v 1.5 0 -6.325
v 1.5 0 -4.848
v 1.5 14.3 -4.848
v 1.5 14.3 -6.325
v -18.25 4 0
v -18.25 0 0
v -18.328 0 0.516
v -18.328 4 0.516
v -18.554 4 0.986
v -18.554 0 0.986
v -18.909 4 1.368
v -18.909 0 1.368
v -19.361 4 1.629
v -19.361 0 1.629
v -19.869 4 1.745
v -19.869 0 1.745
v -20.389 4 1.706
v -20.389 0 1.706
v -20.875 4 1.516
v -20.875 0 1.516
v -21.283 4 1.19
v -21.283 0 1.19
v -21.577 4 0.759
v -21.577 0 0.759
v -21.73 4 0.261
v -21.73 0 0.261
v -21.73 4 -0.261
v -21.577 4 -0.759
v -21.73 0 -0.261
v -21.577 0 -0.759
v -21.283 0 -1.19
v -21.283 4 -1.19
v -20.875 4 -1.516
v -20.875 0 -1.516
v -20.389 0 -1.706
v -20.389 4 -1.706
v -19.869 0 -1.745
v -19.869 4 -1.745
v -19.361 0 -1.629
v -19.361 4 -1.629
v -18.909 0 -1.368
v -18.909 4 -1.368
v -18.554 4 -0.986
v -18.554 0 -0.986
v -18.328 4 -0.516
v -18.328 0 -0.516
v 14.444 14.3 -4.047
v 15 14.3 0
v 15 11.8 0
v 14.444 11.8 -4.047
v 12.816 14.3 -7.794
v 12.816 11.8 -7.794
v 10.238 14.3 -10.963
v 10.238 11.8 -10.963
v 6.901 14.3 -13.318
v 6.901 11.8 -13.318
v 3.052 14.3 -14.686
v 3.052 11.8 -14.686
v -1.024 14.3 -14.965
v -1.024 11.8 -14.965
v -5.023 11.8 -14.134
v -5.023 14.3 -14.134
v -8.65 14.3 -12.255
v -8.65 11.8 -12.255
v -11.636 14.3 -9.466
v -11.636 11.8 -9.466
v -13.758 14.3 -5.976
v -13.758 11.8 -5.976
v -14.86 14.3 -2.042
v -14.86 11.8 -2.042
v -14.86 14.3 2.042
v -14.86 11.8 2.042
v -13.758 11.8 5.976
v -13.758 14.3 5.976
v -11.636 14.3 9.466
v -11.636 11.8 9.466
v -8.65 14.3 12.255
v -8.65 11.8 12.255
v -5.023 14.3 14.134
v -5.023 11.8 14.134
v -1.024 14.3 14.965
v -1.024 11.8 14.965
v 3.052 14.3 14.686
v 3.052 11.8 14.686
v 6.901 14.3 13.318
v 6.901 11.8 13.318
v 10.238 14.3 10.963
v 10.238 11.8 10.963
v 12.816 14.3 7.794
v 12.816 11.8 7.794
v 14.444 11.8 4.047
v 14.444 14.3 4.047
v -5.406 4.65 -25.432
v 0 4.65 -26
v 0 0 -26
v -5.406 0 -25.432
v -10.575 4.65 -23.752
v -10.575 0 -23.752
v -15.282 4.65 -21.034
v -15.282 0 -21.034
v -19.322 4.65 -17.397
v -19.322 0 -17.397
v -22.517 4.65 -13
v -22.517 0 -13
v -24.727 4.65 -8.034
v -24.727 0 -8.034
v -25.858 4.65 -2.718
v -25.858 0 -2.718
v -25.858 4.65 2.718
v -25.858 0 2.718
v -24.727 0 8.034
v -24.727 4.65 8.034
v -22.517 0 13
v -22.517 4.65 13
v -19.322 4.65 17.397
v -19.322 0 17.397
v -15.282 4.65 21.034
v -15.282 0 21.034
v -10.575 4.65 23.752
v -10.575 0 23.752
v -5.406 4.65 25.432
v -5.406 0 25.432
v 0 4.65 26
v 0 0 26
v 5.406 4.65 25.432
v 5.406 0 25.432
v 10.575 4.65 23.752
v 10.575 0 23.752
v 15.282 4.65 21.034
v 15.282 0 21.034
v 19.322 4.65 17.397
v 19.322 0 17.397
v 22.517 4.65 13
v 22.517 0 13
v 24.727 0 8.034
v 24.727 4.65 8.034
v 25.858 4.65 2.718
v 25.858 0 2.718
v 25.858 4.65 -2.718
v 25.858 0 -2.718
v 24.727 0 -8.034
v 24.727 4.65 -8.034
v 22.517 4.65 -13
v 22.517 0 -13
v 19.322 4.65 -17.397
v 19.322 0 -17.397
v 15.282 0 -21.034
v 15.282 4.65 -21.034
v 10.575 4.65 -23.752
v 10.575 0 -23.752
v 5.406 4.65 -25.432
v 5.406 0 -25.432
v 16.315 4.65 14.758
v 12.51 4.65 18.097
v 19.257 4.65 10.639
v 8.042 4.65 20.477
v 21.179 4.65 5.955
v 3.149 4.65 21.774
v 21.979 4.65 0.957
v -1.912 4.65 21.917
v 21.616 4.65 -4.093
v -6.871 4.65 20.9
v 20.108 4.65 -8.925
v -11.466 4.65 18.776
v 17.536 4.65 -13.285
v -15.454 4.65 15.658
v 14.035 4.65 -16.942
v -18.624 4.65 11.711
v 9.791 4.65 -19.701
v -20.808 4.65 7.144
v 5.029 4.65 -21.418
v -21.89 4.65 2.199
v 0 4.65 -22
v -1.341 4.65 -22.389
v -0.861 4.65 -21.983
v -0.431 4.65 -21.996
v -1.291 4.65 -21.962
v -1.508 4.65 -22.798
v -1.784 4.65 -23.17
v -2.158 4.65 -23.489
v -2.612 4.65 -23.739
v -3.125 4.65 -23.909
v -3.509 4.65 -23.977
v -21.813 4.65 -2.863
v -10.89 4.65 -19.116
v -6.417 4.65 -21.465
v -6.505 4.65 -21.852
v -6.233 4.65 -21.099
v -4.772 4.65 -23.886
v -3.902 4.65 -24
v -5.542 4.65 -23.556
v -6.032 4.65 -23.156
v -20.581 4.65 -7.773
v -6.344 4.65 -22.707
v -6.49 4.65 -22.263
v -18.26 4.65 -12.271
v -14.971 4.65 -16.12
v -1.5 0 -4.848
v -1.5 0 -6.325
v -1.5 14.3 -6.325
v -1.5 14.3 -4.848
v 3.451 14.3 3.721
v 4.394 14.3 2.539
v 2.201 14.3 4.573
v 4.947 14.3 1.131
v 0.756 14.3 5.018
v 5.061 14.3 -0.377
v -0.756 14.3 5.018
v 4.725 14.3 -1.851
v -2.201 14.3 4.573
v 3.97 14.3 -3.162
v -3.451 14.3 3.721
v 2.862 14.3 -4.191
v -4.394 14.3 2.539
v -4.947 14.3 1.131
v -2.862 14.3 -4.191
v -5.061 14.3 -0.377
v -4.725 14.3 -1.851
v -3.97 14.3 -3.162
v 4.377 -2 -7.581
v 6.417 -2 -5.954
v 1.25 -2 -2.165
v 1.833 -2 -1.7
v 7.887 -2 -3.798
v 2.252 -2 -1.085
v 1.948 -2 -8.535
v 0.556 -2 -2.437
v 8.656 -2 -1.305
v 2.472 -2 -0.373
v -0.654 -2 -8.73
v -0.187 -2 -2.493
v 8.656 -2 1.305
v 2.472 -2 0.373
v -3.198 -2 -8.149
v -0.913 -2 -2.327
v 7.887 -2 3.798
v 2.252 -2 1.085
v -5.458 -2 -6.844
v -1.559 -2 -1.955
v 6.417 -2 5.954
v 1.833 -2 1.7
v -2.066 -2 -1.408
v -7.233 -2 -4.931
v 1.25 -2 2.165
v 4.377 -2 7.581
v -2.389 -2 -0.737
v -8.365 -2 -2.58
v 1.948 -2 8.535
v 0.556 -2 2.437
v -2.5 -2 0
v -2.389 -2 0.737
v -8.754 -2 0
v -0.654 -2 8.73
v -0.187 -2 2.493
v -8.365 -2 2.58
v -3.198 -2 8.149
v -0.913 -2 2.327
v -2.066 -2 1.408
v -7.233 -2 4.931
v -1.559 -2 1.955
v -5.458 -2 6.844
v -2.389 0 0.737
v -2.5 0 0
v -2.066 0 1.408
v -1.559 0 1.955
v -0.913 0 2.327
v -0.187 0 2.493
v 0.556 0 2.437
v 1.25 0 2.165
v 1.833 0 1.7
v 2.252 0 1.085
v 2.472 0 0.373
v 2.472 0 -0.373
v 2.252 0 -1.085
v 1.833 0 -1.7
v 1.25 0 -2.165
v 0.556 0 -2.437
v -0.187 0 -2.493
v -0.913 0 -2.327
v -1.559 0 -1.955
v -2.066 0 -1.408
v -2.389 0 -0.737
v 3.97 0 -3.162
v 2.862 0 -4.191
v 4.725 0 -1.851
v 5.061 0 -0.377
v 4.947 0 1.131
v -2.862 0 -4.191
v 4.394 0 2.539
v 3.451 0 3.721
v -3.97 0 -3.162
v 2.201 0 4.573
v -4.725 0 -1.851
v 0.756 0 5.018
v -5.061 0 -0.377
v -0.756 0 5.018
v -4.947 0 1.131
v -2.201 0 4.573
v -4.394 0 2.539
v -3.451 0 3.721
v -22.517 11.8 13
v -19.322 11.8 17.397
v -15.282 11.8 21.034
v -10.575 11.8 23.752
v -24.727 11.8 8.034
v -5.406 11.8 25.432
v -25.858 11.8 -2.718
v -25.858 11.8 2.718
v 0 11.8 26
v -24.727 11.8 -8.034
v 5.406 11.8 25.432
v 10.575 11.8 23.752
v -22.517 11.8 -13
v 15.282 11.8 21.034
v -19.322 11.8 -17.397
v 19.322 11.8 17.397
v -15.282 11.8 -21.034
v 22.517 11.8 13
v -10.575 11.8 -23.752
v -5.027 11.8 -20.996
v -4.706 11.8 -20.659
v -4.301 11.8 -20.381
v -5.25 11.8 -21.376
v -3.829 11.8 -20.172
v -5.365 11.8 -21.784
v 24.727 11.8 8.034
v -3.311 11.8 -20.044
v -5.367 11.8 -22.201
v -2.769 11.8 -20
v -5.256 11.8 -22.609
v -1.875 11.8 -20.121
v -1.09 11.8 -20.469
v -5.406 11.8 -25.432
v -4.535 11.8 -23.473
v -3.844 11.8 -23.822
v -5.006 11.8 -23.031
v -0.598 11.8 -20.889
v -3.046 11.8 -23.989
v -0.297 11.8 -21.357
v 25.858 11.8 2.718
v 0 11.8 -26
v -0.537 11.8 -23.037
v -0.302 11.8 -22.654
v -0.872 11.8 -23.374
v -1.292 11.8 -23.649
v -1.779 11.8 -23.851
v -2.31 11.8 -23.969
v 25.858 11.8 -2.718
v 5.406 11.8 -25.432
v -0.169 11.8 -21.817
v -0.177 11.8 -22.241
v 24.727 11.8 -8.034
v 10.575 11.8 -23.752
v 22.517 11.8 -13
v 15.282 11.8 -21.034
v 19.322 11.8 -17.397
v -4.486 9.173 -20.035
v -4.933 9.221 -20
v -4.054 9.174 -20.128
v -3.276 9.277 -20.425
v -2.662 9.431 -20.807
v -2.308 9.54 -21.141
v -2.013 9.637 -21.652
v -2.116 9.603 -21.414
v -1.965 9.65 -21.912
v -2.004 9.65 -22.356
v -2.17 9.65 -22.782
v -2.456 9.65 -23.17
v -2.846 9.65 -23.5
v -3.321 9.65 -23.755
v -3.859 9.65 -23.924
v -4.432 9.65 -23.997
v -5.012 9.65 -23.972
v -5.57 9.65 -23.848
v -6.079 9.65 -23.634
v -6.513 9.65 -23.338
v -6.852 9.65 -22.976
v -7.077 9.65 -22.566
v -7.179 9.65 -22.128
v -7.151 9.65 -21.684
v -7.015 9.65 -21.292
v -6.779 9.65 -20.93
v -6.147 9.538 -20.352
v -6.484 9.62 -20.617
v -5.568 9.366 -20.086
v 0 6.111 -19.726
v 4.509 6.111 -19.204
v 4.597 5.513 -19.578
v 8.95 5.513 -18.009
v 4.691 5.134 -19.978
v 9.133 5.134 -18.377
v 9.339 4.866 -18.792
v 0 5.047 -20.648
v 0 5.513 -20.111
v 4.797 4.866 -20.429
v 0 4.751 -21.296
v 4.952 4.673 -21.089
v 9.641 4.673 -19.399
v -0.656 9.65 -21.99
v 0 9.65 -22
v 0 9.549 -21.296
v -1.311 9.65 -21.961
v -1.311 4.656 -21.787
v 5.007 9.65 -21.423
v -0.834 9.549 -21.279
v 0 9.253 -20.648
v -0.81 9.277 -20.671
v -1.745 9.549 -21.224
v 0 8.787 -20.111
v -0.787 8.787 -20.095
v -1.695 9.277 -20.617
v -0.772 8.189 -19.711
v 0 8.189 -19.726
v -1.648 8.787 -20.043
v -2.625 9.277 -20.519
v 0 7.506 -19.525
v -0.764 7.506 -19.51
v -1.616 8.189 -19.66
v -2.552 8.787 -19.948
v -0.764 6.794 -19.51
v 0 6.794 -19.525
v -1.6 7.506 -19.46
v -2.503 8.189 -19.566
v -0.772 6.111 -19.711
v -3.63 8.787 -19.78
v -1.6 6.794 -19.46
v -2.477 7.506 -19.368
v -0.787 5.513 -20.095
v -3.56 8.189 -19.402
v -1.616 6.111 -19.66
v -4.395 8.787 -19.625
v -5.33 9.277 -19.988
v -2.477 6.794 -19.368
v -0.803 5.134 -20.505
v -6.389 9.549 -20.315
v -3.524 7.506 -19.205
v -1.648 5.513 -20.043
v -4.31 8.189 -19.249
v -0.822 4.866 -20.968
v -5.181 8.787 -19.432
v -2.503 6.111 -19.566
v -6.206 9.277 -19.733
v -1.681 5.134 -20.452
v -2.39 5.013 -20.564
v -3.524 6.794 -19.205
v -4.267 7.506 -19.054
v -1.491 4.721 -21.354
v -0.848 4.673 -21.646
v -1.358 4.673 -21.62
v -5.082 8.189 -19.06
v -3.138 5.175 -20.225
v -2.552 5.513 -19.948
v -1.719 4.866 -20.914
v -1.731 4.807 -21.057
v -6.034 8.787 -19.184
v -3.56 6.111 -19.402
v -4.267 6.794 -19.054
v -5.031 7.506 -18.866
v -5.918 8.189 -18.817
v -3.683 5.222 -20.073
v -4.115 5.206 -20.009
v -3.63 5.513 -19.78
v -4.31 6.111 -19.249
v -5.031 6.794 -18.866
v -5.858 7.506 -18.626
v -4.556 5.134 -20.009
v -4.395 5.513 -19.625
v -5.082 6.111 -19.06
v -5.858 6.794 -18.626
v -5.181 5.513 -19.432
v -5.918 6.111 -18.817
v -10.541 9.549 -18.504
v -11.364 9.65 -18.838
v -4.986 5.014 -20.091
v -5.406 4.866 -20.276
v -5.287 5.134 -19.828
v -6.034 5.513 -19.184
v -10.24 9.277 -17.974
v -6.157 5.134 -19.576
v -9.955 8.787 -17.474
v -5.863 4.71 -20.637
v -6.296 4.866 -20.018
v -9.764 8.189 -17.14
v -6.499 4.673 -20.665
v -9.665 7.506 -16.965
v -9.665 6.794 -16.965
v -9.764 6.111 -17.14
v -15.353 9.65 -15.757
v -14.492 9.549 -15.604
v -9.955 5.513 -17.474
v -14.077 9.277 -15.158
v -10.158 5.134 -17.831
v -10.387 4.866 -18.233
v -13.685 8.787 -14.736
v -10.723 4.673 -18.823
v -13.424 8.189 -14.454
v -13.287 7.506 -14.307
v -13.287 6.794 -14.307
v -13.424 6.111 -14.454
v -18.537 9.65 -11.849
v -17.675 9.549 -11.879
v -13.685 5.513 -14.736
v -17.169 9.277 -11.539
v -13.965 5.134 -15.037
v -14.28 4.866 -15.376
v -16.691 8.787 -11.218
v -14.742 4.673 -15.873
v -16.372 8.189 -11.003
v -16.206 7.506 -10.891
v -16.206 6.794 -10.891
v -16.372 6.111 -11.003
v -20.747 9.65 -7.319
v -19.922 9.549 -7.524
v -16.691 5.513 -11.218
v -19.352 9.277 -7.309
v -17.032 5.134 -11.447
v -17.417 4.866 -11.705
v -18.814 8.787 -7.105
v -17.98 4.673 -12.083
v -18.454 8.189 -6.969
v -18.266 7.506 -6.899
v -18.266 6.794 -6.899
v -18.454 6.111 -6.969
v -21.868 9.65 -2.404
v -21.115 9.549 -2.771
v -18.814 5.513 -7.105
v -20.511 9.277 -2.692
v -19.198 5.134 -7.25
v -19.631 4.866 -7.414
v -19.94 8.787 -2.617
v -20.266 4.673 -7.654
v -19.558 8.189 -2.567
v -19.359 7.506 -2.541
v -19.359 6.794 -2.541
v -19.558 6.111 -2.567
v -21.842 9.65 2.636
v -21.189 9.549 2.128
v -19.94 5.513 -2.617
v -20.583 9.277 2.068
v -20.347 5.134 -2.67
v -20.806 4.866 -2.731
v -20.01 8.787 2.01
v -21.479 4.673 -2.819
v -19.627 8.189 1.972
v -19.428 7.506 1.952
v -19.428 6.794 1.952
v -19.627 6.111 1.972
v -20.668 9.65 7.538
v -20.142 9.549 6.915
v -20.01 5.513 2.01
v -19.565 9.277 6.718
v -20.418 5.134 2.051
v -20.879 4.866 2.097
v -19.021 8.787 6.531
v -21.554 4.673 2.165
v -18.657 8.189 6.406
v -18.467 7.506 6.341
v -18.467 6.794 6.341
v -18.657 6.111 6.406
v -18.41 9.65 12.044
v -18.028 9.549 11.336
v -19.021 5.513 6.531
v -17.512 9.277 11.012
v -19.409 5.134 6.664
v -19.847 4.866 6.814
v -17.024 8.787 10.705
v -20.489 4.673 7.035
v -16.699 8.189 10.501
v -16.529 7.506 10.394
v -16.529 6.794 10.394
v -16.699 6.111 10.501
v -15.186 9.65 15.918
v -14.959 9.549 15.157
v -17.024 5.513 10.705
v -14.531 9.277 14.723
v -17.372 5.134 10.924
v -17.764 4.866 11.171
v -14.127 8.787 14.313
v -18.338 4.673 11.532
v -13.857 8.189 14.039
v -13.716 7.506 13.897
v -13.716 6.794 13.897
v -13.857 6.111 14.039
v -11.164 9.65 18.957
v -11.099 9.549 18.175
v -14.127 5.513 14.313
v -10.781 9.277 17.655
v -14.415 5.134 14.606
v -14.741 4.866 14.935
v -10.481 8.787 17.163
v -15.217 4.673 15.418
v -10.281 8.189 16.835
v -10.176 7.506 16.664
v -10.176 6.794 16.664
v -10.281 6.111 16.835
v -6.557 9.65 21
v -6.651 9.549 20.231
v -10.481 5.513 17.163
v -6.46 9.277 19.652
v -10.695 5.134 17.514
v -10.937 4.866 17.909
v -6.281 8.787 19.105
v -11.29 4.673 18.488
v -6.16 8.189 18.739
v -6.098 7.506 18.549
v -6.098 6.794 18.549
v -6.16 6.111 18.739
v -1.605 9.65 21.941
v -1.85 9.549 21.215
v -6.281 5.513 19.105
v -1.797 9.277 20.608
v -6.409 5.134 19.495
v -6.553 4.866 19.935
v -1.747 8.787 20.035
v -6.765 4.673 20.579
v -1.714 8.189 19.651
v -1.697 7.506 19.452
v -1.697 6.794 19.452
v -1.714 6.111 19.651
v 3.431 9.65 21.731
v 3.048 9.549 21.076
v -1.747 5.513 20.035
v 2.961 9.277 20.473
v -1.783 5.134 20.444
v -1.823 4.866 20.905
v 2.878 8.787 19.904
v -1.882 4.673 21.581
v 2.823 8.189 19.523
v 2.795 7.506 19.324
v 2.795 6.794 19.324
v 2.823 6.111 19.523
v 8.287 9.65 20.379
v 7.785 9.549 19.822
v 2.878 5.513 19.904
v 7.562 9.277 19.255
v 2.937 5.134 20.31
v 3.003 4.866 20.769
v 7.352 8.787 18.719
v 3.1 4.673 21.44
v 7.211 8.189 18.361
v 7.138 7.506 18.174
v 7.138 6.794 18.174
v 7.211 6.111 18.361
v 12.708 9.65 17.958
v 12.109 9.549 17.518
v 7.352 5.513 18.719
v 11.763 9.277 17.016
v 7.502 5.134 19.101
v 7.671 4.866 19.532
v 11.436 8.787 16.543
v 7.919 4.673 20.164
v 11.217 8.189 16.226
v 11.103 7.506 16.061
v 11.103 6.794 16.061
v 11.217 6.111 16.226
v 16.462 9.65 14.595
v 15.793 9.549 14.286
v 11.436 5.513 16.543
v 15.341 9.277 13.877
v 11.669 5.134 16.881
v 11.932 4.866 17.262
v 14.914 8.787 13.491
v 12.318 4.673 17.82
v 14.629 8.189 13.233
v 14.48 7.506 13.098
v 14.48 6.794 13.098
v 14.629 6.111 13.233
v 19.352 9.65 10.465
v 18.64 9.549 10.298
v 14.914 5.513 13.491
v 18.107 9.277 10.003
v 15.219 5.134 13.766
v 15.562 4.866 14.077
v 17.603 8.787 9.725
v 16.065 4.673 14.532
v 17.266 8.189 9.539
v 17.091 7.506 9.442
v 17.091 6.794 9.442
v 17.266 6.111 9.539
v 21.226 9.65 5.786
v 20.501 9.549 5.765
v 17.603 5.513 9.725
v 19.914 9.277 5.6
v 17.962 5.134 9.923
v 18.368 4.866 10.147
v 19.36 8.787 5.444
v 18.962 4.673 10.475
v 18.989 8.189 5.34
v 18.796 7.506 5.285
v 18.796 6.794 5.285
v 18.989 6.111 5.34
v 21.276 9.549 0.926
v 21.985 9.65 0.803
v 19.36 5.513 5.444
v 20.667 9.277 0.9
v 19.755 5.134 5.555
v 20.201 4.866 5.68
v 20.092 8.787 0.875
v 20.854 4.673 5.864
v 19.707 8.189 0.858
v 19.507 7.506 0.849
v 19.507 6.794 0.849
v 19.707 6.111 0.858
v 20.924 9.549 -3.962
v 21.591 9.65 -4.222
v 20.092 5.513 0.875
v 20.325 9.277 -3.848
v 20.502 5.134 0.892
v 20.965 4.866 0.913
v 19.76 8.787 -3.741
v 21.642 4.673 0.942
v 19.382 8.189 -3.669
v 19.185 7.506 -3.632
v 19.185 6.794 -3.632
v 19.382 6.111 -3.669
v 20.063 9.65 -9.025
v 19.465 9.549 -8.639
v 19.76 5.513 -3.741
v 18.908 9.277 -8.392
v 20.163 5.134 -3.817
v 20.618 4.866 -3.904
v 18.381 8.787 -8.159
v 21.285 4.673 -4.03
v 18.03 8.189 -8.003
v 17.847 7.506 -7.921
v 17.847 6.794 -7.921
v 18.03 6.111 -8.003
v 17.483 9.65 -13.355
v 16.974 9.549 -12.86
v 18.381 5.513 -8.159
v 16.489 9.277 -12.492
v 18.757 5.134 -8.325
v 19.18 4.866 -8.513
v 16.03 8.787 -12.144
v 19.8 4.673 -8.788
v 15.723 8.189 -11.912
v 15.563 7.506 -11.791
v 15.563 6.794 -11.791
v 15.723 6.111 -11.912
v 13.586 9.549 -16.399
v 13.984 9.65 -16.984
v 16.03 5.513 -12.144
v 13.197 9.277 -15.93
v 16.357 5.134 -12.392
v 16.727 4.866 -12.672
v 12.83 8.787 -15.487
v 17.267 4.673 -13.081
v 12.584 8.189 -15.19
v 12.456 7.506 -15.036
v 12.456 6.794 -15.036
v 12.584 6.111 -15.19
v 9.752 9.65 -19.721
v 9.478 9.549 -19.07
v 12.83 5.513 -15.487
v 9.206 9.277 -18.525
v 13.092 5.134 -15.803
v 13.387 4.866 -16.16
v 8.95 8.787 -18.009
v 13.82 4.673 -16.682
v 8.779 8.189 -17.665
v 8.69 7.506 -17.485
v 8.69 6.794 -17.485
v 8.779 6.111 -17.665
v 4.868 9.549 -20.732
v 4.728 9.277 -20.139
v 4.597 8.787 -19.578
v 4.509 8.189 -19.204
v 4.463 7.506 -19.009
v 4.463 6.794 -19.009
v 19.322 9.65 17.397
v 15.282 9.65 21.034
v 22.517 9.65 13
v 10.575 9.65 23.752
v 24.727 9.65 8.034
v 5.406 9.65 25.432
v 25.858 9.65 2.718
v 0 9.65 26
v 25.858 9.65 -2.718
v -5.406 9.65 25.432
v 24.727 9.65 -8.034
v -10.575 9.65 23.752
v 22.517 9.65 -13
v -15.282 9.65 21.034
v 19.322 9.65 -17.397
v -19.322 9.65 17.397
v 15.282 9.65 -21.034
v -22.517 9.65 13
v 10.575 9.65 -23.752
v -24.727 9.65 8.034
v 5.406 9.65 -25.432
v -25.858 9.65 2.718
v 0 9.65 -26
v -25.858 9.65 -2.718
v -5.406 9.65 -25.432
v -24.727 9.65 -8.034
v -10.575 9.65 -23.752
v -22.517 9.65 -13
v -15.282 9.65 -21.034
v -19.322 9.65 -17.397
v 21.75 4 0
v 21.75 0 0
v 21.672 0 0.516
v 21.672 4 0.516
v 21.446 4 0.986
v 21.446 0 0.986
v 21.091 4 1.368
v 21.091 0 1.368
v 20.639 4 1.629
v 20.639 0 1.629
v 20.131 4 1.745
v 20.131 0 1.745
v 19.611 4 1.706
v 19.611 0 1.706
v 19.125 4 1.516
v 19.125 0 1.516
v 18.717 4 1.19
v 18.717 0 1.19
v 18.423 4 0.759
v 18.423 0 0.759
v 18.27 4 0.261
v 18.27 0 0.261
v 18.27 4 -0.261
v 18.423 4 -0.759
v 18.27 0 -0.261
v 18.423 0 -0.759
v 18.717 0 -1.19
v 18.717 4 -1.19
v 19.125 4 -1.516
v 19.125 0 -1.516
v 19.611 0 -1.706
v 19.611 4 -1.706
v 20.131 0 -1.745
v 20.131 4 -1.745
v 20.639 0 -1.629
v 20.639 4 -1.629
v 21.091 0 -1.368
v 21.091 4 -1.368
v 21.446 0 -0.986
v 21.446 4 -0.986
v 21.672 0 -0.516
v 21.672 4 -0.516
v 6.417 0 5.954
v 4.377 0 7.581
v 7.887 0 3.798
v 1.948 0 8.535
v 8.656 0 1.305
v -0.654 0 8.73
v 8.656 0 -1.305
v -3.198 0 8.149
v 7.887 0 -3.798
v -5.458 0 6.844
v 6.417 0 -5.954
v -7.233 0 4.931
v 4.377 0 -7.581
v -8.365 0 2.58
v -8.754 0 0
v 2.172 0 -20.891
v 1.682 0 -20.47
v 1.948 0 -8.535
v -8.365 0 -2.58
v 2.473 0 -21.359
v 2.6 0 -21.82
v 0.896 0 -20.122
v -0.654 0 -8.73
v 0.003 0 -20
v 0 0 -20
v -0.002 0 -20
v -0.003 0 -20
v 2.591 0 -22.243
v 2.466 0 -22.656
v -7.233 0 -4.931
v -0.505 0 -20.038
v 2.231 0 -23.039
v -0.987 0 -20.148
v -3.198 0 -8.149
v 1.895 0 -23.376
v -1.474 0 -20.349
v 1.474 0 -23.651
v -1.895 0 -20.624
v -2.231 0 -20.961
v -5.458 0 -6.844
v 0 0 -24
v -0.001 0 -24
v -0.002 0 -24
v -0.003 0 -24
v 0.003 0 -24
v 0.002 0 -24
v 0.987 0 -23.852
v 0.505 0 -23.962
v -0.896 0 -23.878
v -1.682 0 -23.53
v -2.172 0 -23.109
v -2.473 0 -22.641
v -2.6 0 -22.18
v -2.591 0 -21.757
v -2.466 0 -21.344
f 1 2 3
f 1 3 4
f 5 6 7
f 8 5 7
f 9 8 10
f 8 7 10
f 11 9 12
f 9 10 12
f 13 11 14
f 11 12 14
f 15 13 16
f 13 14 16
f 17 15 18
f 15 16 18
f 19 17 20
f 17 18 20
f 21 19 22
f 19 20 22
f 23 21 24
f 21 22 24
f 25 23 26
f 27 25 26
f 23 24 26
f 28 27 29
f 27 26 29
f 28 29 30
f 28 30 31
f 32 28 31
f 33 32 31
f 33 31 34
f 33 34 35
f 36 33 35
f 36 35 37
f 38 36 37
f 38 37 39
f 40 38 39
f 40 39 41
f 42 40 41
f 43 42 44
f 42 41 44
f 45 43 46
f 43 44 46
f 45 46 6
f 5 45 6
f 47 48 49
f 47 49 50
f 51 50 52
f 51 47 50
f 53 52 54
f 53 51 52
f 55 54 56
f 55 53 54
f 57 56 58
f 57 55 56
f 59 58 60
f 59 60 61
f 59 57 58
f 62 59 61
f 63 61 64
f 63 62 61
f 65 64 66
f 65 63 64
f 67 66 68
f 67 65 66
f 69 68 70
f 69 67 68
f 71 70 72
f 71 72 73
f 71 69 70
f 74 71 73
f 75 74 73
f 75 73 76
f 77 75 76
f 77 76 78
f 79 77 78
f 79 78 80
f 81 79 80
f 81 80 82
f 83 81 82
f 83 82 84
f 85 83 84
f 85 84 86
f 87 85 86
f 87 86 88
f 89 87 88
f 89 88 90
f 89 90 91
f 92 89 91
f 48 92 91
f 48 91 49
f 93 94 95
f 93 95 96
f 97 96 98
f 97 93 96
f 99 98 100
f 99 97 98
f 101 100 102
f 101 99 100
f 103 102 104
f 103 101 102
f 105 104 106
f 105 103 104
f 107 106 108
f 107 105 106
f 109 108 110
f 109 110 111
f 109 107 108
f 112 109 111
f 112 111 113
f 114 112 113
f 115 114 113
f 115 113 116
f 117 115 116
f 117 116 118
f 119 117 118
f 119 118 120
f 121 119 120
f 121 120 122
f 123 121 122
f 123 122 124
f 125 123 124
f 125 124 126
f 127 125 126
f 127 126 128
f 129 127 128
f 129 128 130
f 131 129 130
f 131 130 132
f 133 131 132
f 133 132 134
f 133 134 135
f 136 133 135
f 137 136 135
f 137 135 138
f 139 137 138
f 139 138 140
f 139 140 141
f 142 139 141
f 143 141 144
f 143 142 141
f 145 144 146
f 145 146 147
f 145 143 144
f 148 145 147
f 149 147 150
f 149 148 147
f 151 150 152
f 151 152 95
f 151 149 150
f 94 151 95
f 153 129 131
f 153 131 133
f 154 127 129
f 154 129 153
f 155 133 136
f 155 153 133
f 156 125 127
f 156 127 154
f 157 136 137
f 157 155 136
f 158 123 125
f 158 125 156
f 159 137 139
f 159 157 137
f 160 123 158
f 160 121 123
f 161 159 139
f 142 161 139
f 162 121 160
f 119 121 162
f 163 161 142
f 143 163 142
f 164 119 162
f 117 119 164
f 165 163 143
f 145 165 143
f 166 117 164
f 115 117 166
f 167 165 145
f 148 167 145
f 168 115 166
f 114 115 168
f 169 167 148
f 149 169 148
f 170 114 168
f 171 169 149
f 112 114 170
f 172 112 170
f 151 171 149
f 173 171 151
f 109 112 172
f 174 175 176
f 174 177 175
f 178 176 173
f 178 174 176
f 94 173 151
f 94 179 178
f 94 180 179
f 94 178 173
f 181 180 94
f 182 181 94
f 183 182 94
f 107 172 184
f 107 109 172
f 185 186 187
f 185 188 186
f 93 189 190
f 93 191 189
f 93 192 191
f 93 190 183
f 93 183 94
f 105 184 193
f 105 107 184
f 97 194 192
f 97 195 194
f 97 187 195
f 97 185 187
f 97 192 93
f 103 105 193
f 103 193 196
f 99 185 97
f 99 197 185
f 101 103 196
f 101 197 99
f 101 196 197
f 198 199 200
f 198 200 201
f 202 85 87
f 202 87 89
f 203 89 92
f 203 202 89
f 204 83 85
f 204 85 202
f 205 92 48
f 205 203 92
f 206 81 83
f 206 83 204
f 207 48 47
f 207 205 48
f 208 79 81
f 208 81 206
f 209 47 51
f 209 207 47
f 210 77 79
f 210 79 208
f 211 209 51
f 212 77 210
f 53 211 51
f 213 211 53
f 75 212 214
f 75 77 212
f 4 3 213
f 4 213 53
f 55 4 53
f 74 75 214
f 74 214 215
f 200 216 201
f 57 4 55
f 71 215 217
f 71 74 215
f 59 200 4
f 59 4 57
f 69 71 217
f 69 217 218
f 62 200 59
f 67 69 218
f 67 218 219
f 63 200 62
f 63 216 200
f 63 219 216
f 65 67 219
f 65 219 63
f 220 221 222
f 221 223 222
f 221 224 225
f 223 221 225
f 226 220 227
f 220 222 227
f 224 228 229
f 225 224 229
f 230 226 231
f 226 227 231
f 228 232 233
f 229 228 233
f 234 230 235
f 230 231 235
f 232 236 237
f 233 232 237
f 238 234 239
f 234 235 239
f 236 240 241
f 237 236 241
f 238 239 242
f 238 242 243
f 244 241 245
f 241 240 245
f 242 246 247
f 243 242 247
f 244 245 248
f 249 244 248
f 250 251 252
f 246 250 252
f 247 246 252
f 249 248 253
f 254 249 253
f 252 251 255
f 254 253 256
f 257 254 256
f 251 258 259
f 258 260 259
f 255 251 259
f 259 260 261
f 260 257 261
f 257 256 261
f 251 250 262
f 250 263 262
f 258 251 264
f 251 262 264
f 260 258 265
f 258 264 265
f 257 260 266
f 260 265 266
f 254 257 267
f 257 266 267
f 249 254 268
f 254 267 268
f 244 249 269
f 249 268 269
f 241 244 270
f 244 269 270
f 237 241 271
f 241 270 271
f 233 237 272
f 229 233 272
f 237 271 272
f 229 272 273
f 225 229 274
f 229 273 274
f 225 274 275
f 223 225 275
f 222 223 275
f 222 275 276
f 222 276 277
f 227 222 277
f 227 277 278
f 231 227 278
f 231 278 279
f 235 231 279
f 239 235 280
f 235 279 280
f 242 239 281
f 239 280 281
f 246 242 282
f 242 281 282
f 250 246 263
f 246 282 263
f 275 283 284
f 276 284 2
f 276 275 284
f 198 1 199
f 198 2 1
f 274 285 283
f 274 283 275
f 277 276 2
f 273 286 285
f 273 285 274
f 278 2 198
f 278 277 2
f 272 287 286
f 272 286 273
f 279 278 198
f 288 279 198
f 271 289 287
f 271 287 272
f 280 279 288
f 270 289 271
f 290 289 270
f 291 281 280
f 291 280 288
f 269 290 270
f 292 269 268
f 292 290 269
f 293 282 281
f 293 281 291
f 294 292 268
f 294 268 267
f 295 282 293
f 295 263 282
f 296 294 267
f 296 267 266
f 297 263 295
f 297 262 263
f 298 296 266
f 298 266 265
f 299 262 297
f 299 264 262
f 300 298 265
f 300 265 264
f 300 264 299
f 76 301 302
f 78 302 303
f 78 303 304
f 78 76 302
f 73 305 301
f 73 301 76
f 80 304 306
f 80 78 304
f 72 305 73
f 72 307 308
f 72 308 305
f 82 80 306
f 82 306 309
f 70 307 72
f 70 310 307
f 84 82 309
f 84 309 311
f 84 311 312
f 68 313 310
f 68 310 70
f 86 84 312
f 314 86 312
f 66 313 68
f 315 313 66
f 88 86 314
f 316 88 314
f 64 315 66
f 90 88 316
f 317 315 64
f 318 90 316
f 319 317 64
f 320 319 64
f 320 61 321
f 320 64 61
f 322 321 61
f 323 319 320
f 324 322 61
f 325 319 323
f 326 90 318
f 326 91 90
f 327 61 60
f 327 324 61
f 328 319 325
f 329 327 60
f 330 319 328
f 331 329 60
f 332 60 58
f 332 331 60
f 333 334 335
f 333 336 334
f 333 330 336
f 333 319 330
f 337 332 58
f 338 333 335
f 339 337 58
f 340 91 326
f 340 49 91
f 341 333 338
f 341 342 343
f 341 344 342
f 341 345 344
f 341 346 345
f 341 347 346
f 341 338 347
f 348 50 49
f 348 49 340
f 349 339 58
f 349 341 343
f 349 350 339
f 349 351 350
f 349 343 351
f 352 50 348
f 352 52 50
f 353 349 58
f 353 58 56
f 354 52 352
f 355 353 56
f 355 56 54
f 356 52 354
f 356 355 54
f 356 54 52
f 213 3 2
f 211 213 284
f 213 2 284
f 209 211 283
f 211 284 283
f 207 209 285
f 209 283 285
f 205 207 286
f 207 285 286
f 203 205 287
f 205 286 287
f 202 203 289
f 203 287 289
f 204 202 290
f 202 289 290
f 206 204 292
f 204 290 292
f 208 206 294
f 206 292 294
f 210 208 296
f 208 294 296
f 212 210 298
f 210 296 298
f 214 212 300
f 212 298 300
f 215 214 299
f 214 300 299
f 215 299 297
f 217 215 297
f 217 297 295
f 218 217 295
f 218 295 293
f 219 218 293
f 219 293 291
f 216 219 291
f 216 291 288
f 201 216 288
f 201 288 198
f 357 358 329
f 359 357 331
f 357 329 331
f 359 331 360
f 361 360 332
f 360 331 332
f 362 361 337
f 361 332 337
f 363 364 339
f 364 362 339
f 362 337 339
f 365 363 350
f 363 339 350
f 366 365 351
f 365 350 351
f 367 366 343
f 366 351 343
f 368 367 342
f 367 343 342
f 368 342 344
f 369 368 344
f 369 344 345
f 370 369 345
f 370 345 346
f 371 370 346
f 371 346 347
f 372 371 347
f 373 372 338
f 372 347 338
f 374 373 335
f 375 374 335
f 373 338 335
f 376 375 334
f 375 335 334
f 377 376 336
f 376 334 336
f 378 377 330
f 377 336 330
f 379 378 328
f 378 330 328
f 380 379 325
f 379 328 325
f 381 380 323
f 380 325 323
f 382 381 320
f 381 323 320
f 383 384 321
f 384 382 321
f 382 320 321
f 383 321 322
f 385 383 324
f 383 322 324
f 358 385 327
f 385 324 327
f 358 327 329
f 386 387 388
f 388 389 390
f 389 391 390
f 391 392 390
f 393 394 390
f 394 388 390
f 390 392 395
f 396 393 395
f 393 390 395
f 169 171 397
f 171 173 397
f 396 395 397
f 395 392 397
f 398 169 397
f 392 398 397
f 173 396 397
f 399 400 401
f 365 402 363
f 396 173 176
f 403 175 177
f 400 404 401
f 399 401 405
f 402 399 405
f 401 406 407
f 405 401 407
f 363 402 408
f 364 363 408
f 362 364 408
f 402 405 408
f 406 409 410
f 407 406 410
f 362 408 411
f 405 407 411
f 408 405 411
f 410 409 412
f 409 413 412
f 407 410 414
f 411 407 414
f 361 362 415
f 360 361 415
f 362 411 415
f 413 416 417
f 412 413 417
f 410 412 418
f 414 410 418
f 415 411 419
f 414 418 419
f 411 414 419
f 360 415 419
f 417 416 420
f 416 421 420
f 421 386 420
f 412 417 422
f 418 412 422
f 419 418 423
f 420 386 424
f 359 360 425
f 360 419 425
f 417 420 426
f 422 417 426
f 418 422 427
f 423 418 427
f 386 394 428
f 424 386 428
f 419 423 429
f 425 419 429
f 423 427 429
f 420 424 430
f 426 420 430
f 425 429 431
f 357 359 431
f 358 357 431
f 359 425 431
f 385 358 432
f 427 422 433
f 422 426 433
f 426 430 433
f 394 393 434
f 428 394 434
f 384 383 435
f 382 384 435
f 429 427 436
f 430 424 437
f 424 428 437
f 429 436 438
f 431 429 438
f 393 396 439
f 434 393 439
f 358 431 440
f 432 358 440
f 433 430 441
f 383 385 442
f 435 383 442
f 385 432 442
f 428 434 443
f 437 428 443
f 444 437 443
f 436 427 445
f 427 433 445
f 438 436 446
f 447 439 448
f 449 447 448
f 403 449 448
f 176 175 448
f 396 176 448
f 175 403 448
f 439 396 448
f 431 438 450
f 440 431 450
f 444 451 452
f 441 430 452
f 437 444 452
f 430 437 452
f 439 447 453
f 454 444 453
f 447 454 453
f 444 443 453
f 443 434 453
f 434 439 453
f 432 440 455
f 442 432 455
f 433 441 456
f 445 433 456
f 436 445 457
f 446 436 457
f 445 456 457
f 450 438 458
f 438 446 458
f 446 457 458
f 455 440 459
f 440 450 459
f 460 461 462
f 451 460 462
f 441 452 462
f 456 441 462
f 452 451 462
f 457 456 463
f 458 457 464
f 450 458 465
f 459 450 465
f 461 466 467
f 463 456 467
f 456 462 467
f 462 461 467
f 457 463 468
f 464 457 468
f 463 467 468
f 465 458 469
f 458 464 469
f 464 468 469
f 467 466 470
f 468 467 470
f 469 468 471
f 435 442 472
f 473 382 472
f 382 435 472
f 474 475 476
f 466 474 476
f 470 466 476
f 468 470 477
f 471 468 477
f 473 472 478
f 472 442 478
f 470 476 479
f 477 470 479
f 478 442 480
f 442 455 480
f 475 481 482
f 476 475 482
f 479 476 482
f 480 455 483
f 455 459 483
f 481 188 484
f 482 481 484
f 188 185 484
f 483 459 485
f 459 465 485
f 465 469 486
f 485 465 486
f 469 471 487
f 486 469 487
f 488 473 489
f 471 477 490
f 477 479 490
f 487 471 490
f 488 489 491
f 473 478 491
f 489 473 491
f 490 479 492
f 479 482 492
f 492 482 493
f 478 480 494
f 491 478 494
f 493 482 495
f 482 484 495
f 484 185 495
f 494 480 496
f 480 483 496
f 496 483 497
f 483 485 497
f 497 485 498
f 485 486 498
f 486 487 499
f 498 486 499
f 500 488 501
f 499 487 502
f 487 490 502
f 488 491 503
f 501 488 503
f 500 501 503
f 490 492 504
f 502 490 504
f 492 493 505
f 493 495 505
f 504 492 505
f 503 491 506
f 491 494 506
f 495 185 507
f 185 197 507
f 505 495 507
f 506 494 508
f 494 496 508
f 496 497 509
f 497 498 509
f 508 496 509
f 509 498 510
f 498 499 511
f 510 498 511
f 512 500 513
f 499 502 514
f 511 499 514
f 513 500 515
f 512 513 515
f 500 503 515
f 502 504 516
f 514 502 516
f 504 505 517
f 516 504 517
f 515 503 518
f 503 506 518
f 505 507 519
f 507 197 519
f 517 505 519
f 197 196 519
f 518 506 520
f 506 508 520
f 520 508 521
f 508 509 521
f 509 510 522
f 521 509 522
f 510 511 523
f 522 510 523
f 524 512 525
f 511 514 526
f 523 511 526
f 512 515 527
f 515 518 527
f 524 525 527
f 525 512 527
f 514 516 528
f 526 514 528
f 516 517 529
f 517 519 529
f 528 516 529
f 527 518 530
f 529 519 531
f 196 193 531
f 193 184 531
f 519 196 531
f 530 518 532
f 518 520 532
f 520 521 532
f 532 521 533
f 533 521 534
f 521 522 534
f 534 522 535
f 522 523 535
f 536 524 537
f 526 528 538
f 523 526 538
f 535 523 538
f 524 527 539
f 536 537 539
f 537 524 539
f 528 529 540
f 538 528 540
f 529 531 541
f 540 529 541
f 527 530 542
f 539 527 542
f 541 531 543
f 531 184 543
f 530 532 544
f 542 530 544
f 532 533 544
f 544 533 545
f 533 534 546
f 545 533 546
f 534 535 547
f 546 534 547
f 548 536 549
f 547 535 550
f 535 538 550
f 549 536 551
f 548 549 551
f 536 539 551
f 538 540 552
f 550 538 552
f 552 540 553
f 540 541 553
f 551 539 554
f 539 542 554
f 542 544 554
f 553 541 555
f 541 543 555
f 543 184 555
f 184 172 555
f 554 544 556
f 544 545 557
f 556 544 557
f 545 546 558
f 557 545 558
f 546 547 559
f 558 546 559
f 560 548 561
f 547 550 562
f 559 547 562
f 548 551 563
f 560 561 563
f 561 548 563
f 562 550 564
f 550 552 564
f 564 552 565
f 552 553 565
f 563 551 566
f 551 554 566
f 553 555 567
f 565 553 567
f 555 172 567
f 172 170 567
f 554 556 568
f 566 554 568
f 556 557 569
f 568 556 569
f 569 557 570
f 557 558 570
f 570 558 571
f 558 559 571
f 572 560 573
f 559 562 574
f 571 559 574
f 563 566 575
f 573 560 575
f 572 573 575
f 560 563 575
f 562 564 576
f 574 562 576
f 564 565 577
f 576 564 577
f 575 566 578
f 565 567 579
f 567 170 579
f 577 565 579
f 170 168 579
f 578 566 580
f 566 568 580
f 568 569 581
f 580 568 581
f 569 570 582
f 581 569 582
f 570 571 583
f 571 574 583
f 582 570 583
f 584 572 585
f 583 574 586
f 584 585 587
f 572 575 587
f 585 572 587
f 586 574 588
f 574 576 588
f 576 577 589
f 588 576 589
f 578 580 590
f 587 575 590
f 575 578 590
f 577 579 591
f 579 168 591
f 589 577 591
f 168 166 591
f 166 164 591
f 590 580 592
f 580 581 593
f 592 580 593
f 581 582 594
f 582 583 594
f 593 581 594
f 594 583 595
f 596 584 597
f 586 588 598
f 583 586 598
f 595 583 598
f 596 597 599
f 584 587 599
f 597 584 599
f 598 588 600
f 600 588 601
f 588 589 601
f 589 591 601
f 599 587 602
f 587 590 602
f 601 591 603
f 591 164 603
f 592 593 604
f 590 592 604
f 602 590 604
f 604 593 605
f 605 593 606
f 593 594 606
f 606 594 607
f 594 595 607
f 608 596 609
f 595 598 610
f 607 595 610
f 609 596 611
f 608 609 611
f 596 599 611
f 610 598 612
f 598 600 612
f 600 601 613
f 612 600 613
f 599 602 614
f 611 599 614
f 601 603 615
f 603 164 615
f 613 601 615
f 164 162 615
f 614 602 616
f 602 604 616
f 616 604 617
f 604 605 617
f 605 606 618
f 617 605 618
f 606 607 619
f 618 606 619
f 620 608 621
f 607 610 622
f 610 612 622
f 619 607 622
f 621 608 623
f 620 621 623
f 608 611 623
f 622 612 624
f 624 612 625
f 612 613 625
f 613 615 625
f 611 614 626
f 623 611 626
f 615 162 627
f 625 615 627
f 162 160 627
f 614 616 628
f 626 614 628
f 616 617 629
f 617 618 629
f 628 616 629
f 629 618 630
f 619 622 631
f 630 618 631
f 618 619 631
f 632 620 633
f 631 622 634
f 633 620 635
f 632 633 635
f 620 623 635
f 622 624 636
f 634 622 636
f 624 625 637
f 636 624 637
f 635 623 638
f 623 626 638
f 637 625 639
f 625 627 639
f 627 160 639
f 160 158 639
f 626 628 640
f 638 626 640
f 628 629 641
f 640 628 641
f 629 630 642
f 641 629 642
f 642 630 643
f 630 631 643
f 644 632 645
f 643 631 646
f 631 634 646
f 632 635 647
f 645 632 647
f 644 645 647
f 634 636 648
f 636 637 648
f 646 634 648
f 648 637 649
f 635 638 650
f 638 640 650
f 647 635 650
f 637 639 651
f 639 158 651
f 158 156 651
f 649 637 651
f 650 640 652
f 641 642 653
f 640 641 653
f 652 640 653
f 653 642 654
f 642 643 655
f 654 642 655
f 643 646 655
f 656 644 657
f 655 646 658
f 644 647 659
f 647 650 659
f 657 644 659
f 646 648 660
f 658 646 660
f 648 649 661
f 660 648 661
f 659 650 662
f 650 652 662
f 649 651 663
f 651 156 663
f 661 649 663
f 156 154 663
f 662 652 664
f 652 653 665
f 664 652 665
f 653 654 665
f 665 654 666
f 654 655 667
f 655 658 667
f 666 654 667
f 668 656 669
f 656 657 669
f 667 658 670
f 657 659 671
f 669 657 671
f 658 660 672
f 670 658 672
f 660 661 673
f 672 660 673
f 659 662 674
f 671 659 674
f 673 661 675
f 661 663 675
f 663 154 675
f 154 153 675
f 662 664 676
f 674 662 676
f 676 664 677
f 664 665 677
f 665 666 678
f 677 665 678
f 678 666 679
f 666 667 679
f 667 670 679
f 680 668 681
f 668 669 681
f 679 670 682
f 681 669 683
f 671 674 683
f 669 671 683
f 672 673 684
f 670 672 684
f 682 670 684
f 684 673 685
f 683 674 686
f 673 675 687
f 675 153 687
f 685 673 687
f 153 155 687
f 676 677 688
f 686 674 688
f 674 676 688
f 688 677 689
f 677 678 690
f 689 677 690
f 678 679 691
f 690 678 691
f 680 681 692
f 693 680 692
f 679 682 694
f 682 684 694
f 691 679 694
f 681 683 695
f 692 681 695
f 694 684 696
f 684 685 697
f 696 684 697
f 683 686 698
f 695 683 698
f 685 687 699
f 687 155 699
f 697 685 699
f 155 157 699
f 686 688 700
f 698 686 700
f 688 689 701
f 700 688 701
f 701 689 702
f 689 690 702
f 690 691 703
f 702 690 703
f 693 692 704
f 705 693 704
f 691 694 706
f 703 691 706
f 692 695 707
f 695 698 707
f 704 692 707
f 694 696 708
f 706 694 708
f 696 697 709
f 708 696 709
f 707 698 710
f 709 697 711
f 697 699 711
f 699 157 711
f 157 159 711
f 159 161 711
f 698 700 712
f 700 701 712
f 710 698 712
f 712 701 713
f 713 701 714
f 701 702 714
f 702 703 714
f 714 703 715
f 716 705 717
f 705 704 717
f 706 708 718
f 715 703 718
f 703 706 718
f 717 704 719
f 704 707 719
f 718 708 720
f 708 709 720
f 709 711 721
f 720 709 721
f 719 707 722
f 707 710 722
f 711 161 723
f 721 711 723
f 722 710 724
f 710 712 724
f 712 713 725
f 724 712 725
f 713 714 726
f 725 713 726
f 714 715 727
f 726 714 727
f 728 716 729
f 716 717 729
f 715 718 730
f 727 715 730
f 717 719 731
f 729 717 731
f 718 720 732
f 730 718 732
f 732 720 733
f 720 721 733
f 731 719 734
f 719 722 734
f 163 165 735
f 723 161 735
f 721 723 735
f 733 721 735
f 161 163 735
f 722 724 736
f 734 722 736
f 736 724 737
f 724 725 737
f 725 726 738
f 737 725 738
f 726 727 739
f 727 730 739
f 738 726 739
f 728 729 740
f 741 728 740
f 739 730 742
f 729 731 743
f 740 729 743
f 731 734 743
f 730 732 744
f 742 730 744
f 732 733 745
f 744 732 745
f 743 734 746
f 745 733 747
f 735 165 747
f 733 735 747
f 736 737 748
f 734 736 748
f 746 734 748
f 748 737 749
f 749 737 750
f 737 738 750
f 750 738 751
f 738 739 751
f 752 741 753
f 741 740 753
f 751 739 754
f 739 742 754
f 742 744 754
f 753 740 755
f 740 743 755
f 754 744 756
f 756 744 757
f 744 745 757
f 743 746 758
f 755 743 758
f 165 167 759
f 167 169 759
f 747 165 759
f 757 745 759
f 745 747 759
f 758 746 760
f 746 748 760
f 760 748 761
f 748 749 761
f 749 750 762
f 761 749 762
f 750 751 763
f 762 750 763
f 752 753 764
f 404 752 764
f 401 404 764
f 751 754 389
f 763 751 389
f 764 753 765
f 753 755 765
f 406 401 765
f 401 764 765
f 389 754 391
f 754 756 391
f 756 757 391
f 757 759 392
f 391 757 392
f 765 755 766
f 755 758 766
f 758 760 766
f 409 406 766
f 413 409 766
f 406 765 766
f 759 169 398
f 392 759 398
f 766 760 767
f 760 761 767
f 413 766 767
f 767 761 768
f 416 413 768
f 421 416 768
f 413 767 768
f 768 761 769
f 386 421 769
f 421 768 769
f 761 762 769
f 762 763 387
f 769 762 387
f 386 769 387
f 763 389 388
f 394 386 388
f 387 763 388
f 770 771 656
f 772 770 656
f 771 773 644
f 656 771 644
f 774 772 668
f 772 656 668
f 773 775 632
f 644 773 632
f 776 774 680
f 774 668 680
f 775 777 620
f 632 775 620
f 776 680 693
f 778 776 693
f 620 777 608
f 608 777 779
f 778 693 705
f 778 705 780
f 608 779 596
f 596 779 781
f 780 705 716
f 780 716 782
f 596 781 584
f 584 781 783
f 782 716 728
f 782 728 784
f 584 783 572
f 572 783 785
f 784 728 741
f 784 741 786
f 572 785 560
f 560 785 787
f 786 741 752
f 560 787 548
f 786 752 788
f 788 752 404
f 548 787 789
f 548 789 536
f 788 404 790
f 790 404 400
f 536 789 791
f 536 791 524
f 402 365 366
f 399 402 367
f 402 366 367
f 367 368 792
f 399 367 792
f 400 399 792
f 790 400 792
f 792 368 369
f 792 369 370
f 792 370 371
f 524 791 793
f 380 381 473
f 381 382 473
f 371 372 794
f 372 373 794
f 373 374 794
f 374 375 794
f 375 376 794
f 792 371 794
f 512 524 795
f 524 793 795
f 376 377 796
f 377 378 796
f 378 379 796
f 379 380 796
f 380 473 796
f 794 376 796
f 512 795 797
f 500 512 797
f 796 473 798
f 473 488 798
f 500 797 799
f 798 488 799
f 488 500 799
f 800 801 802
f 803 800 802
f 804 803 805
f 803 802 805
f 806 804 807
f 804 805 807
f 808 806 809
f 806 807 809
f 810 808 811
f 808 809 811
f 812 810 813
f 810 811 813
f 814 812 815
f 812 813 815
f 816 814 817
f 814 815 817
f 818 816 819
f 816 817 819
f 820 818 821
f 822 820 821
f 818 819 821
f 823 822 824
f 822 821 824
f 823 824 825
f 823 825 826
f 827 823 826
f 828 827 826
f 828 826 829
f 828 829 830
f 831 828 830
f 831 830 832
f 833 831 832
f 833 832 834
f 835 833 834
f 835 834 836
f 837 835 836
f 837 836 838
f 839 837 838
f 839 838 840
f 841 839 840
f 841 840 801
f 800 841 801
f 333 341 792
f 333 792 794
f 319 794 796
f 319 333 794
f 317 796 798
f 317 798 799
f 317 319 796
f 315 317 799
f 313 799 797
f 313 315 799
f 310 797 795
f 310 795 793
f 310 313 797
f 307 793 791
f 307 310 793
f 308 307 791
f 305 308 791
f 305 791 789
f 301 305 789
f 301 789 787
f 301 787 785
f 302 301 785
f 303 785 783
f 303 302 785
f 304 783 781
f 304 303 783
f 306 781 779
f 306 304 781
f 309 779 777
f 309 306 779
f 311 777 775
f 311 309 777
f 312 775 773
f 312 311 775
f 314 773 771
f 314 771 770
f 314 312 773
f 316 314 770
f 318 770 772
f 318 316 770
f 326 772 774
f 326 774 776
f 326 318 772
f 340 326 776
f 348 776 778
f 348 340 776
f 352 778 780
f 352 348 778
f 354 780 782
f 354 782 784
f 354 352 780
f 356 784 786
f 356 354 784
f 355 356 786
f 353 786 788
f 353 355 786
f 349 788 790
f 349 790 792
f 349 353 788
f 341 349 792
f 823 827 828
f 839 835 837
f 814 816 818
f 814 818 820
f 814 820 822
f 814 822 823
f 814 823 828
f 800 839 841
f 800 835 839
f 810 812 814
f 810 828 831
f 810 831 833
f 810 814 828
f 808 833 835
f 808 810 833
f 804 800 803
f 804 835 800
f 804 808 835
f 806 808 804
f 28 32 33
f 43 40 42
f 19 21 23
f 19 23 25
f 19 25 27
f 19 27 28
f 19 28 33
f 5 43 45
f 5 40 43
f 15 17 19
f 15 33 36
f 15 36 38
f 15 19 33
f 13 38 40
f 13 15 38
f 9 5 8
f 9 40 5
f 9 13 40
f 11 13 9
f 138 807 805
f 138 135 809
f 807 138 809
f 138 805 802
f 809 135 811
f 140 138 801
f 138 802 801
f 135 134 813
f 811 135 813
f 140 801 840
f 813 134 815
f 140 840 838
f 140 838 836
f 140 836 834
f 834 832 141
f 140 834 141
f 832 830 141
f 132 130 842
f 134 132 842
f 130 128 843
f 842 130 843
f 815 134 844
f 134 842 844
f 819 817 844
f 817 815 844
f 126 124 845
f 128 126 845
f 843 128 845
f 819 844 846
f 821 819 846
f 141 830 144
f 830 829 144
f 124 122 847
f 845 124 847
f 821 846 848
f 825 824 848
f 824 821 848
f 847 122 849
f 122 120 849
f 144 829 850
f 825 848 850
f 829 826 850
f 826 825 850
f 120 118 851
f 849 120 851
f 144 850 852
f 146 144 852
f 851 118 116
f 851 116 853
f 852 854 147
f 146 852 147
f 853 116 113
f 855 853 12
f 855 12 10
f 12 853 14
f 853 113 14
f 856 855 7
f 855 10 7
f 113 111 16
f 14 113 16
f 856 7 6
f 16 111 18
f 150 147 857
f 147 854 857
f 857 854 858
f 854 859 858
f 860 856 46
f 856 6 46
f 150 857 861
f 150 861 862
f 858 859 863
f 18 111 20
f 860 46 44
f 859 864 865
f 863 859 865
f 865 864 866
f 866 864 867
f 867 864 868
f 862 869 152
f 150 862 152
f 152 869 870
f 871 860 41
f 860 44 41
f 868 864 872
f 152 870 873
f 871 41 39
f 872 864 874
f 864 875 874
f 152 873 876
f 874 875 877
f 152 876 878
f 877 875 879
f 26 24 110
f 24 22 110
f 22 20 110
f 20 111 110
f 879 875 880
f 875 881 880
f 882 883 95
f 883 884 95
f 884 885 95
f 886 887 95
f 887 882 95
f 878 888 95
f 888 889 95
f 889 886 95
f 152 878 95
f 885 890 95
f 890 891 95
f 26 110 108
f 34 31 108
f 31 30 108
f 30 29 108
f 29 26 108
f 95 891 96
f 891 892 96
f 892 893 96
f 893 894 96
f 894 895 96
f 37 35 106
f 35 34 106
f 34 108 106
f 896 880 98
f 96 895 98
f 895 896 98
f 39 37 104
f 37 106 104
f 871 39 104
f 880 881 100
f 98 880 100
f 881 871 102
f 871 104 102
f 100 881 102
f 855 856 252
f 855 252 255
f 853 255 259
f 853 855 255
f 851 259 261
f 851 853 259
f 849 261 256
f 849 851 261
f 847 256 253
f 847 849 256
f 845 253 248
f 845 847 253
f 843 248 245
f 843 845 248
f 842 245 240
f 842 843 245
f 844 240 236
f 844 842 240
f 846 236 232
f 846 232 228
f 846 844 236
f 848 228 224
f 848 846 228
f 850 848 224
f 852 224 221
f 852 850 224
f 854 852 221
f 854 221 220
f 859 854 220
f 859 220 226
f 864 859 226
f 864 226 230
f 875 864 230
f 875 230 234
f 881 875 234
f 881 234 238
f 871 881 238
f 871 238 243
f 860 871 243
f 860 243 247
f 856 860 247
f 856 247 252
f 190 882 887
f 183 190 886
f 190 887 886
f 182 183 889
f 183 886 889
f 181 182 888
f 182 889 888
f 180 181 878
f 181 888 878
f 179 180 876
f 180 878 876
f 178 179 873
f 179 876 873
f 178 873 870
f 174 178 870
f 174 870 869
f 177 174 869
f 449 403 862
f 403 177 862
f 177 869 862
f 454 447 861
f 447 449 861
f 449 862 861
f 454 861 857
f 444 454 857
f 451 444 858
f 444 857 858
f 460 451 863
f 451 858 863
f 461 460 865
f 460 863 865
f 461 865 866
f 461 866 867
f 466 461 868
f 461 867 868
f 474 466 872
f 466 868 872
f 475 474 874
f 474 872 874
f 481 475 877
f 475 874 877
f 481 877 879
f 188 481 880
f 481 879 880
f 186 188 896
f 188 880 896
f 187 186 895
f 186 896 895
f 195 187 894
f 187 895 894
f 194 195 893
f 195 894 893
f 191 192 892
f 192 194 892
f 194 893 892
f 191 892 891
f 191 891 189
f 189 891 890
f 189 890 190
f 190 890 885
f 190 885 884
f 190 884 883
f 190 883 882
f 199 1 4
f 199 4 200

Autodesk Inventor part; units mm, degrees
ref_plane "YZ Plane" through (0, 0, 0) normal (1, 0, 0) x (0, 1, 0)
sketch "Sketch1" plane through (0, 0, 0) normal (0, 1, 0) x (-1, 0, 0)
  circle A0 centre (0, 0) radius 5.075
  circle A1 centre (0, 0) radius 20
  line L0 (1.5, -3.825) -> (-1.5, -3.825)
  line L1 (-1.5, -3.825) -> (-1.5, -6.325)
  line L2 (-1.5, -6.325) -> (1.5, -6.325)
  line L3 (1.5, -6.325) -> (1.5, -3.825)
  line L4 (1.5, -3.825) -> (-1.5, -6.325) construction
  line L5 (-1.5, -3.825) -> (1.5, -6.325) construction
  circle A2 centre (0, 0) radius 2.5
  circle A3 centre (0, 0) radius 8.754
  point P0 (0, -5.075)
  point P1 (-1.5, -4.8483)
  point P2 (1.5, -4.8483)
  dimension "d0" = 10.15
  dimension "d1" = 40
  dimension "d2" = 1.25
  dimension "d3" = 3
  dimension "d17" = 5
extrude "Extrusion1" add sketch "Sketch1" along normal blind 14.3 contours A1 | A3
sketch "Sketch2" plane through (0, 0, 0) normal (1, 0, 0) x (0, 1, 0)
  line L0 (0, 0) -> (14.3, 0)
  line L1 (14.3, 0) -> (14.3, -22)
  line L2 (14.3, -22) -> (0, -22) construction
  line L3 (0, -22) -> (0, 0)
  line L4 (0, -22) -> (14.3, -22) construction
  line L5 (14.3, -22) -> (14.3, -20.0661)
  line L6 (0, -20) -> (14.3, -20) projected
  circle A0 centre (7.15, -22) radius 2.5
  line L7 (9.65, -22) -> (4.65, -22)
  line L8 (4.65, -22) -> (4.65, -26)
  line L9 (4.65, -26) -> (9.65, -26)
  line L10 (9.65, -26) -> (9.65, -22)
  line L11 (14.3, -20) -> (0, -20)
  line L12 (0, -20) -> (0, -26)
  line L13 (0, -26) -> (14.3, -26)
  line L14 (14.3, -26) -> (14.3, -20)
  point P0 (5.65, -20)
  point P1 (14.3, -22)
  point P2 (14.3, -20)
  point P3 (8.65, -20)
  point P4 (14.3, -20)
  point P5 (8.65, -20)
  dimension "d22" = 5
  dimension "d7" = 22
  dimension "d10" = 14.3
  dimension "d23" = 4
  dimension "d31" = 6
  dimension "d41" = 14.3
  dimension "d42" = 5
revolve "Revolution1" add sketch "Sketch2" angle 360 about axis through (0, 0, 0) along (0, 1, 0) contours L0 L1 L6 A0 L3 | L6 A0 L8 L13 L12 L3 | L1 L14 L13 L10 A0 L6 | A0 L6
extrude "Extrusion3" add sketch "Sketch1" against normal blind 2 contours A0 L3 L0 L1 | L1 L0 L3 A0 | A0 L3 L2 L1 | A3
revolve "Revolution4" cut sketch "Sketch2" angle 360 about axis through (0, 0, 0) along (0, 1, 0) contours A0 L6
sketch "Sketch3" plane through (0, 0, 0) normal (0, -1, 0) x (1, 0, 0)
  line L0 (0, 0) -> (0, -22)
  dimension "d25" = 22
ref_plane "Work Plane1" through (0, 0, 0) normal (0.6427876, -0.7660444, 0) x (0, 0, -1)
sketch "Sketch4" plane through (0, 0, 0) normal (0.6427876, -0.7660444, 0) x (0, 0, -1)
  ellipse E0 centre (0, 2.7318) end of major axis (22, 2.7318) minor radius 16.853 projected
  line L0 (0, 0) -> (22, 0)
  circle A0 centre (22, 0) radius 2
  dimension "d27" = 22
  dimension "d28" = 4
extrude "Extrusion4" cut sketch "Sketch4" against normal blind 9 contours A0 L0 E0 | E0 A0 | E0 L0 A0 picked at (22.5049, 0.1658)
extrude "Extrusion5" cut sketch "Sketch4" along normal blind 7 contours A0 L0 E0 | E0 A0 | E0 L0 A0 picked at (22.5049, 0.1658)
ref_plane "Work Plane2" through (0, 14.3, -22) normal (0.6427876, 0.7660444, 0) x (0, 0, 1)
sketch "Sketch5" plane through (0, 14.3, -22) normal (0.6427876, 0.7660444, 0) x (0, 0, 1)
  ellipse E0 centre (22, -0.5142) end of major axis (27.075, -0.5142) minor radius 3.8877 (17.1517, -1.6633) -> (17.1517, 0.6348) ccw projected
  line L0 (22, -0.5142) -> (0, -0.5142)
  circle A0 centre (0, -0.5142) radius 2
  point P0 (22, 9.1919)
  dimension "d35" = 22
  dimension "d36" = 4
extrude "Extrusion6" cut sketch "Sketch5" against normal blind 9
extrude "Extrusion7" cut sketch "Sketch5" along normal blind 8
extrude "Extrusion8" cut sketch "Sketch1" along normal through all contours A0 L3 L0 L1 | L1 L0 L3 A0 | A0 L3 L2 L1 | A2
sketch "Sketch6" plane through (0, 14.3, 0) normal (0, 1, 0) x (1, 0, 0)
  circle A0 centre (0, 0) radius 15
  circle A1 centre (0, 0) radius 35.6972
  dimension "d45" = 30
extrude "Extrusion9" cut sketch "Sketch6" against normal blind 2.5
sketch "Sketch7" plane through (0, 0, 0) normal (0, -1, 0) x (1, 0, 0)
  circle A0 centre (0, 0) radius 2.5 projected
  circle A1 centre (0, 0) radius 20
  line L0 (24, -7.5) -> (-24, -7.5)
  line L1 (-24, -7.5) -> (-24, 7.5)
  line L2 (-24, 7.5) -> (24, 7.5)
  line L3 (24, 7.5) -> (24, -7.5)
  line L4 (24, -7.5) -> (-24, 7.5) construction
  line L5 (-24, -7.5) -> (24, 7.5) construction
  circle A2 centre (0, 0) radius 11
  circle A3 centre (20, 0) radius 1.75
  circle A4 centre (-20, 0) radius 1.75
  dimension "d48" = 40
  dimension "d49" = 48
  dimension "d50" = 15
  dimension "d51" = 22
  dimension "d52" = 3.5
  dimension "d53" = 3.5
extrude "Extrusion10" cut sketch "Sketch7" against normal blind 4 contours A1 A3 | A1 A3 | A4 A1 | A1 A4
properties part number "spool"
